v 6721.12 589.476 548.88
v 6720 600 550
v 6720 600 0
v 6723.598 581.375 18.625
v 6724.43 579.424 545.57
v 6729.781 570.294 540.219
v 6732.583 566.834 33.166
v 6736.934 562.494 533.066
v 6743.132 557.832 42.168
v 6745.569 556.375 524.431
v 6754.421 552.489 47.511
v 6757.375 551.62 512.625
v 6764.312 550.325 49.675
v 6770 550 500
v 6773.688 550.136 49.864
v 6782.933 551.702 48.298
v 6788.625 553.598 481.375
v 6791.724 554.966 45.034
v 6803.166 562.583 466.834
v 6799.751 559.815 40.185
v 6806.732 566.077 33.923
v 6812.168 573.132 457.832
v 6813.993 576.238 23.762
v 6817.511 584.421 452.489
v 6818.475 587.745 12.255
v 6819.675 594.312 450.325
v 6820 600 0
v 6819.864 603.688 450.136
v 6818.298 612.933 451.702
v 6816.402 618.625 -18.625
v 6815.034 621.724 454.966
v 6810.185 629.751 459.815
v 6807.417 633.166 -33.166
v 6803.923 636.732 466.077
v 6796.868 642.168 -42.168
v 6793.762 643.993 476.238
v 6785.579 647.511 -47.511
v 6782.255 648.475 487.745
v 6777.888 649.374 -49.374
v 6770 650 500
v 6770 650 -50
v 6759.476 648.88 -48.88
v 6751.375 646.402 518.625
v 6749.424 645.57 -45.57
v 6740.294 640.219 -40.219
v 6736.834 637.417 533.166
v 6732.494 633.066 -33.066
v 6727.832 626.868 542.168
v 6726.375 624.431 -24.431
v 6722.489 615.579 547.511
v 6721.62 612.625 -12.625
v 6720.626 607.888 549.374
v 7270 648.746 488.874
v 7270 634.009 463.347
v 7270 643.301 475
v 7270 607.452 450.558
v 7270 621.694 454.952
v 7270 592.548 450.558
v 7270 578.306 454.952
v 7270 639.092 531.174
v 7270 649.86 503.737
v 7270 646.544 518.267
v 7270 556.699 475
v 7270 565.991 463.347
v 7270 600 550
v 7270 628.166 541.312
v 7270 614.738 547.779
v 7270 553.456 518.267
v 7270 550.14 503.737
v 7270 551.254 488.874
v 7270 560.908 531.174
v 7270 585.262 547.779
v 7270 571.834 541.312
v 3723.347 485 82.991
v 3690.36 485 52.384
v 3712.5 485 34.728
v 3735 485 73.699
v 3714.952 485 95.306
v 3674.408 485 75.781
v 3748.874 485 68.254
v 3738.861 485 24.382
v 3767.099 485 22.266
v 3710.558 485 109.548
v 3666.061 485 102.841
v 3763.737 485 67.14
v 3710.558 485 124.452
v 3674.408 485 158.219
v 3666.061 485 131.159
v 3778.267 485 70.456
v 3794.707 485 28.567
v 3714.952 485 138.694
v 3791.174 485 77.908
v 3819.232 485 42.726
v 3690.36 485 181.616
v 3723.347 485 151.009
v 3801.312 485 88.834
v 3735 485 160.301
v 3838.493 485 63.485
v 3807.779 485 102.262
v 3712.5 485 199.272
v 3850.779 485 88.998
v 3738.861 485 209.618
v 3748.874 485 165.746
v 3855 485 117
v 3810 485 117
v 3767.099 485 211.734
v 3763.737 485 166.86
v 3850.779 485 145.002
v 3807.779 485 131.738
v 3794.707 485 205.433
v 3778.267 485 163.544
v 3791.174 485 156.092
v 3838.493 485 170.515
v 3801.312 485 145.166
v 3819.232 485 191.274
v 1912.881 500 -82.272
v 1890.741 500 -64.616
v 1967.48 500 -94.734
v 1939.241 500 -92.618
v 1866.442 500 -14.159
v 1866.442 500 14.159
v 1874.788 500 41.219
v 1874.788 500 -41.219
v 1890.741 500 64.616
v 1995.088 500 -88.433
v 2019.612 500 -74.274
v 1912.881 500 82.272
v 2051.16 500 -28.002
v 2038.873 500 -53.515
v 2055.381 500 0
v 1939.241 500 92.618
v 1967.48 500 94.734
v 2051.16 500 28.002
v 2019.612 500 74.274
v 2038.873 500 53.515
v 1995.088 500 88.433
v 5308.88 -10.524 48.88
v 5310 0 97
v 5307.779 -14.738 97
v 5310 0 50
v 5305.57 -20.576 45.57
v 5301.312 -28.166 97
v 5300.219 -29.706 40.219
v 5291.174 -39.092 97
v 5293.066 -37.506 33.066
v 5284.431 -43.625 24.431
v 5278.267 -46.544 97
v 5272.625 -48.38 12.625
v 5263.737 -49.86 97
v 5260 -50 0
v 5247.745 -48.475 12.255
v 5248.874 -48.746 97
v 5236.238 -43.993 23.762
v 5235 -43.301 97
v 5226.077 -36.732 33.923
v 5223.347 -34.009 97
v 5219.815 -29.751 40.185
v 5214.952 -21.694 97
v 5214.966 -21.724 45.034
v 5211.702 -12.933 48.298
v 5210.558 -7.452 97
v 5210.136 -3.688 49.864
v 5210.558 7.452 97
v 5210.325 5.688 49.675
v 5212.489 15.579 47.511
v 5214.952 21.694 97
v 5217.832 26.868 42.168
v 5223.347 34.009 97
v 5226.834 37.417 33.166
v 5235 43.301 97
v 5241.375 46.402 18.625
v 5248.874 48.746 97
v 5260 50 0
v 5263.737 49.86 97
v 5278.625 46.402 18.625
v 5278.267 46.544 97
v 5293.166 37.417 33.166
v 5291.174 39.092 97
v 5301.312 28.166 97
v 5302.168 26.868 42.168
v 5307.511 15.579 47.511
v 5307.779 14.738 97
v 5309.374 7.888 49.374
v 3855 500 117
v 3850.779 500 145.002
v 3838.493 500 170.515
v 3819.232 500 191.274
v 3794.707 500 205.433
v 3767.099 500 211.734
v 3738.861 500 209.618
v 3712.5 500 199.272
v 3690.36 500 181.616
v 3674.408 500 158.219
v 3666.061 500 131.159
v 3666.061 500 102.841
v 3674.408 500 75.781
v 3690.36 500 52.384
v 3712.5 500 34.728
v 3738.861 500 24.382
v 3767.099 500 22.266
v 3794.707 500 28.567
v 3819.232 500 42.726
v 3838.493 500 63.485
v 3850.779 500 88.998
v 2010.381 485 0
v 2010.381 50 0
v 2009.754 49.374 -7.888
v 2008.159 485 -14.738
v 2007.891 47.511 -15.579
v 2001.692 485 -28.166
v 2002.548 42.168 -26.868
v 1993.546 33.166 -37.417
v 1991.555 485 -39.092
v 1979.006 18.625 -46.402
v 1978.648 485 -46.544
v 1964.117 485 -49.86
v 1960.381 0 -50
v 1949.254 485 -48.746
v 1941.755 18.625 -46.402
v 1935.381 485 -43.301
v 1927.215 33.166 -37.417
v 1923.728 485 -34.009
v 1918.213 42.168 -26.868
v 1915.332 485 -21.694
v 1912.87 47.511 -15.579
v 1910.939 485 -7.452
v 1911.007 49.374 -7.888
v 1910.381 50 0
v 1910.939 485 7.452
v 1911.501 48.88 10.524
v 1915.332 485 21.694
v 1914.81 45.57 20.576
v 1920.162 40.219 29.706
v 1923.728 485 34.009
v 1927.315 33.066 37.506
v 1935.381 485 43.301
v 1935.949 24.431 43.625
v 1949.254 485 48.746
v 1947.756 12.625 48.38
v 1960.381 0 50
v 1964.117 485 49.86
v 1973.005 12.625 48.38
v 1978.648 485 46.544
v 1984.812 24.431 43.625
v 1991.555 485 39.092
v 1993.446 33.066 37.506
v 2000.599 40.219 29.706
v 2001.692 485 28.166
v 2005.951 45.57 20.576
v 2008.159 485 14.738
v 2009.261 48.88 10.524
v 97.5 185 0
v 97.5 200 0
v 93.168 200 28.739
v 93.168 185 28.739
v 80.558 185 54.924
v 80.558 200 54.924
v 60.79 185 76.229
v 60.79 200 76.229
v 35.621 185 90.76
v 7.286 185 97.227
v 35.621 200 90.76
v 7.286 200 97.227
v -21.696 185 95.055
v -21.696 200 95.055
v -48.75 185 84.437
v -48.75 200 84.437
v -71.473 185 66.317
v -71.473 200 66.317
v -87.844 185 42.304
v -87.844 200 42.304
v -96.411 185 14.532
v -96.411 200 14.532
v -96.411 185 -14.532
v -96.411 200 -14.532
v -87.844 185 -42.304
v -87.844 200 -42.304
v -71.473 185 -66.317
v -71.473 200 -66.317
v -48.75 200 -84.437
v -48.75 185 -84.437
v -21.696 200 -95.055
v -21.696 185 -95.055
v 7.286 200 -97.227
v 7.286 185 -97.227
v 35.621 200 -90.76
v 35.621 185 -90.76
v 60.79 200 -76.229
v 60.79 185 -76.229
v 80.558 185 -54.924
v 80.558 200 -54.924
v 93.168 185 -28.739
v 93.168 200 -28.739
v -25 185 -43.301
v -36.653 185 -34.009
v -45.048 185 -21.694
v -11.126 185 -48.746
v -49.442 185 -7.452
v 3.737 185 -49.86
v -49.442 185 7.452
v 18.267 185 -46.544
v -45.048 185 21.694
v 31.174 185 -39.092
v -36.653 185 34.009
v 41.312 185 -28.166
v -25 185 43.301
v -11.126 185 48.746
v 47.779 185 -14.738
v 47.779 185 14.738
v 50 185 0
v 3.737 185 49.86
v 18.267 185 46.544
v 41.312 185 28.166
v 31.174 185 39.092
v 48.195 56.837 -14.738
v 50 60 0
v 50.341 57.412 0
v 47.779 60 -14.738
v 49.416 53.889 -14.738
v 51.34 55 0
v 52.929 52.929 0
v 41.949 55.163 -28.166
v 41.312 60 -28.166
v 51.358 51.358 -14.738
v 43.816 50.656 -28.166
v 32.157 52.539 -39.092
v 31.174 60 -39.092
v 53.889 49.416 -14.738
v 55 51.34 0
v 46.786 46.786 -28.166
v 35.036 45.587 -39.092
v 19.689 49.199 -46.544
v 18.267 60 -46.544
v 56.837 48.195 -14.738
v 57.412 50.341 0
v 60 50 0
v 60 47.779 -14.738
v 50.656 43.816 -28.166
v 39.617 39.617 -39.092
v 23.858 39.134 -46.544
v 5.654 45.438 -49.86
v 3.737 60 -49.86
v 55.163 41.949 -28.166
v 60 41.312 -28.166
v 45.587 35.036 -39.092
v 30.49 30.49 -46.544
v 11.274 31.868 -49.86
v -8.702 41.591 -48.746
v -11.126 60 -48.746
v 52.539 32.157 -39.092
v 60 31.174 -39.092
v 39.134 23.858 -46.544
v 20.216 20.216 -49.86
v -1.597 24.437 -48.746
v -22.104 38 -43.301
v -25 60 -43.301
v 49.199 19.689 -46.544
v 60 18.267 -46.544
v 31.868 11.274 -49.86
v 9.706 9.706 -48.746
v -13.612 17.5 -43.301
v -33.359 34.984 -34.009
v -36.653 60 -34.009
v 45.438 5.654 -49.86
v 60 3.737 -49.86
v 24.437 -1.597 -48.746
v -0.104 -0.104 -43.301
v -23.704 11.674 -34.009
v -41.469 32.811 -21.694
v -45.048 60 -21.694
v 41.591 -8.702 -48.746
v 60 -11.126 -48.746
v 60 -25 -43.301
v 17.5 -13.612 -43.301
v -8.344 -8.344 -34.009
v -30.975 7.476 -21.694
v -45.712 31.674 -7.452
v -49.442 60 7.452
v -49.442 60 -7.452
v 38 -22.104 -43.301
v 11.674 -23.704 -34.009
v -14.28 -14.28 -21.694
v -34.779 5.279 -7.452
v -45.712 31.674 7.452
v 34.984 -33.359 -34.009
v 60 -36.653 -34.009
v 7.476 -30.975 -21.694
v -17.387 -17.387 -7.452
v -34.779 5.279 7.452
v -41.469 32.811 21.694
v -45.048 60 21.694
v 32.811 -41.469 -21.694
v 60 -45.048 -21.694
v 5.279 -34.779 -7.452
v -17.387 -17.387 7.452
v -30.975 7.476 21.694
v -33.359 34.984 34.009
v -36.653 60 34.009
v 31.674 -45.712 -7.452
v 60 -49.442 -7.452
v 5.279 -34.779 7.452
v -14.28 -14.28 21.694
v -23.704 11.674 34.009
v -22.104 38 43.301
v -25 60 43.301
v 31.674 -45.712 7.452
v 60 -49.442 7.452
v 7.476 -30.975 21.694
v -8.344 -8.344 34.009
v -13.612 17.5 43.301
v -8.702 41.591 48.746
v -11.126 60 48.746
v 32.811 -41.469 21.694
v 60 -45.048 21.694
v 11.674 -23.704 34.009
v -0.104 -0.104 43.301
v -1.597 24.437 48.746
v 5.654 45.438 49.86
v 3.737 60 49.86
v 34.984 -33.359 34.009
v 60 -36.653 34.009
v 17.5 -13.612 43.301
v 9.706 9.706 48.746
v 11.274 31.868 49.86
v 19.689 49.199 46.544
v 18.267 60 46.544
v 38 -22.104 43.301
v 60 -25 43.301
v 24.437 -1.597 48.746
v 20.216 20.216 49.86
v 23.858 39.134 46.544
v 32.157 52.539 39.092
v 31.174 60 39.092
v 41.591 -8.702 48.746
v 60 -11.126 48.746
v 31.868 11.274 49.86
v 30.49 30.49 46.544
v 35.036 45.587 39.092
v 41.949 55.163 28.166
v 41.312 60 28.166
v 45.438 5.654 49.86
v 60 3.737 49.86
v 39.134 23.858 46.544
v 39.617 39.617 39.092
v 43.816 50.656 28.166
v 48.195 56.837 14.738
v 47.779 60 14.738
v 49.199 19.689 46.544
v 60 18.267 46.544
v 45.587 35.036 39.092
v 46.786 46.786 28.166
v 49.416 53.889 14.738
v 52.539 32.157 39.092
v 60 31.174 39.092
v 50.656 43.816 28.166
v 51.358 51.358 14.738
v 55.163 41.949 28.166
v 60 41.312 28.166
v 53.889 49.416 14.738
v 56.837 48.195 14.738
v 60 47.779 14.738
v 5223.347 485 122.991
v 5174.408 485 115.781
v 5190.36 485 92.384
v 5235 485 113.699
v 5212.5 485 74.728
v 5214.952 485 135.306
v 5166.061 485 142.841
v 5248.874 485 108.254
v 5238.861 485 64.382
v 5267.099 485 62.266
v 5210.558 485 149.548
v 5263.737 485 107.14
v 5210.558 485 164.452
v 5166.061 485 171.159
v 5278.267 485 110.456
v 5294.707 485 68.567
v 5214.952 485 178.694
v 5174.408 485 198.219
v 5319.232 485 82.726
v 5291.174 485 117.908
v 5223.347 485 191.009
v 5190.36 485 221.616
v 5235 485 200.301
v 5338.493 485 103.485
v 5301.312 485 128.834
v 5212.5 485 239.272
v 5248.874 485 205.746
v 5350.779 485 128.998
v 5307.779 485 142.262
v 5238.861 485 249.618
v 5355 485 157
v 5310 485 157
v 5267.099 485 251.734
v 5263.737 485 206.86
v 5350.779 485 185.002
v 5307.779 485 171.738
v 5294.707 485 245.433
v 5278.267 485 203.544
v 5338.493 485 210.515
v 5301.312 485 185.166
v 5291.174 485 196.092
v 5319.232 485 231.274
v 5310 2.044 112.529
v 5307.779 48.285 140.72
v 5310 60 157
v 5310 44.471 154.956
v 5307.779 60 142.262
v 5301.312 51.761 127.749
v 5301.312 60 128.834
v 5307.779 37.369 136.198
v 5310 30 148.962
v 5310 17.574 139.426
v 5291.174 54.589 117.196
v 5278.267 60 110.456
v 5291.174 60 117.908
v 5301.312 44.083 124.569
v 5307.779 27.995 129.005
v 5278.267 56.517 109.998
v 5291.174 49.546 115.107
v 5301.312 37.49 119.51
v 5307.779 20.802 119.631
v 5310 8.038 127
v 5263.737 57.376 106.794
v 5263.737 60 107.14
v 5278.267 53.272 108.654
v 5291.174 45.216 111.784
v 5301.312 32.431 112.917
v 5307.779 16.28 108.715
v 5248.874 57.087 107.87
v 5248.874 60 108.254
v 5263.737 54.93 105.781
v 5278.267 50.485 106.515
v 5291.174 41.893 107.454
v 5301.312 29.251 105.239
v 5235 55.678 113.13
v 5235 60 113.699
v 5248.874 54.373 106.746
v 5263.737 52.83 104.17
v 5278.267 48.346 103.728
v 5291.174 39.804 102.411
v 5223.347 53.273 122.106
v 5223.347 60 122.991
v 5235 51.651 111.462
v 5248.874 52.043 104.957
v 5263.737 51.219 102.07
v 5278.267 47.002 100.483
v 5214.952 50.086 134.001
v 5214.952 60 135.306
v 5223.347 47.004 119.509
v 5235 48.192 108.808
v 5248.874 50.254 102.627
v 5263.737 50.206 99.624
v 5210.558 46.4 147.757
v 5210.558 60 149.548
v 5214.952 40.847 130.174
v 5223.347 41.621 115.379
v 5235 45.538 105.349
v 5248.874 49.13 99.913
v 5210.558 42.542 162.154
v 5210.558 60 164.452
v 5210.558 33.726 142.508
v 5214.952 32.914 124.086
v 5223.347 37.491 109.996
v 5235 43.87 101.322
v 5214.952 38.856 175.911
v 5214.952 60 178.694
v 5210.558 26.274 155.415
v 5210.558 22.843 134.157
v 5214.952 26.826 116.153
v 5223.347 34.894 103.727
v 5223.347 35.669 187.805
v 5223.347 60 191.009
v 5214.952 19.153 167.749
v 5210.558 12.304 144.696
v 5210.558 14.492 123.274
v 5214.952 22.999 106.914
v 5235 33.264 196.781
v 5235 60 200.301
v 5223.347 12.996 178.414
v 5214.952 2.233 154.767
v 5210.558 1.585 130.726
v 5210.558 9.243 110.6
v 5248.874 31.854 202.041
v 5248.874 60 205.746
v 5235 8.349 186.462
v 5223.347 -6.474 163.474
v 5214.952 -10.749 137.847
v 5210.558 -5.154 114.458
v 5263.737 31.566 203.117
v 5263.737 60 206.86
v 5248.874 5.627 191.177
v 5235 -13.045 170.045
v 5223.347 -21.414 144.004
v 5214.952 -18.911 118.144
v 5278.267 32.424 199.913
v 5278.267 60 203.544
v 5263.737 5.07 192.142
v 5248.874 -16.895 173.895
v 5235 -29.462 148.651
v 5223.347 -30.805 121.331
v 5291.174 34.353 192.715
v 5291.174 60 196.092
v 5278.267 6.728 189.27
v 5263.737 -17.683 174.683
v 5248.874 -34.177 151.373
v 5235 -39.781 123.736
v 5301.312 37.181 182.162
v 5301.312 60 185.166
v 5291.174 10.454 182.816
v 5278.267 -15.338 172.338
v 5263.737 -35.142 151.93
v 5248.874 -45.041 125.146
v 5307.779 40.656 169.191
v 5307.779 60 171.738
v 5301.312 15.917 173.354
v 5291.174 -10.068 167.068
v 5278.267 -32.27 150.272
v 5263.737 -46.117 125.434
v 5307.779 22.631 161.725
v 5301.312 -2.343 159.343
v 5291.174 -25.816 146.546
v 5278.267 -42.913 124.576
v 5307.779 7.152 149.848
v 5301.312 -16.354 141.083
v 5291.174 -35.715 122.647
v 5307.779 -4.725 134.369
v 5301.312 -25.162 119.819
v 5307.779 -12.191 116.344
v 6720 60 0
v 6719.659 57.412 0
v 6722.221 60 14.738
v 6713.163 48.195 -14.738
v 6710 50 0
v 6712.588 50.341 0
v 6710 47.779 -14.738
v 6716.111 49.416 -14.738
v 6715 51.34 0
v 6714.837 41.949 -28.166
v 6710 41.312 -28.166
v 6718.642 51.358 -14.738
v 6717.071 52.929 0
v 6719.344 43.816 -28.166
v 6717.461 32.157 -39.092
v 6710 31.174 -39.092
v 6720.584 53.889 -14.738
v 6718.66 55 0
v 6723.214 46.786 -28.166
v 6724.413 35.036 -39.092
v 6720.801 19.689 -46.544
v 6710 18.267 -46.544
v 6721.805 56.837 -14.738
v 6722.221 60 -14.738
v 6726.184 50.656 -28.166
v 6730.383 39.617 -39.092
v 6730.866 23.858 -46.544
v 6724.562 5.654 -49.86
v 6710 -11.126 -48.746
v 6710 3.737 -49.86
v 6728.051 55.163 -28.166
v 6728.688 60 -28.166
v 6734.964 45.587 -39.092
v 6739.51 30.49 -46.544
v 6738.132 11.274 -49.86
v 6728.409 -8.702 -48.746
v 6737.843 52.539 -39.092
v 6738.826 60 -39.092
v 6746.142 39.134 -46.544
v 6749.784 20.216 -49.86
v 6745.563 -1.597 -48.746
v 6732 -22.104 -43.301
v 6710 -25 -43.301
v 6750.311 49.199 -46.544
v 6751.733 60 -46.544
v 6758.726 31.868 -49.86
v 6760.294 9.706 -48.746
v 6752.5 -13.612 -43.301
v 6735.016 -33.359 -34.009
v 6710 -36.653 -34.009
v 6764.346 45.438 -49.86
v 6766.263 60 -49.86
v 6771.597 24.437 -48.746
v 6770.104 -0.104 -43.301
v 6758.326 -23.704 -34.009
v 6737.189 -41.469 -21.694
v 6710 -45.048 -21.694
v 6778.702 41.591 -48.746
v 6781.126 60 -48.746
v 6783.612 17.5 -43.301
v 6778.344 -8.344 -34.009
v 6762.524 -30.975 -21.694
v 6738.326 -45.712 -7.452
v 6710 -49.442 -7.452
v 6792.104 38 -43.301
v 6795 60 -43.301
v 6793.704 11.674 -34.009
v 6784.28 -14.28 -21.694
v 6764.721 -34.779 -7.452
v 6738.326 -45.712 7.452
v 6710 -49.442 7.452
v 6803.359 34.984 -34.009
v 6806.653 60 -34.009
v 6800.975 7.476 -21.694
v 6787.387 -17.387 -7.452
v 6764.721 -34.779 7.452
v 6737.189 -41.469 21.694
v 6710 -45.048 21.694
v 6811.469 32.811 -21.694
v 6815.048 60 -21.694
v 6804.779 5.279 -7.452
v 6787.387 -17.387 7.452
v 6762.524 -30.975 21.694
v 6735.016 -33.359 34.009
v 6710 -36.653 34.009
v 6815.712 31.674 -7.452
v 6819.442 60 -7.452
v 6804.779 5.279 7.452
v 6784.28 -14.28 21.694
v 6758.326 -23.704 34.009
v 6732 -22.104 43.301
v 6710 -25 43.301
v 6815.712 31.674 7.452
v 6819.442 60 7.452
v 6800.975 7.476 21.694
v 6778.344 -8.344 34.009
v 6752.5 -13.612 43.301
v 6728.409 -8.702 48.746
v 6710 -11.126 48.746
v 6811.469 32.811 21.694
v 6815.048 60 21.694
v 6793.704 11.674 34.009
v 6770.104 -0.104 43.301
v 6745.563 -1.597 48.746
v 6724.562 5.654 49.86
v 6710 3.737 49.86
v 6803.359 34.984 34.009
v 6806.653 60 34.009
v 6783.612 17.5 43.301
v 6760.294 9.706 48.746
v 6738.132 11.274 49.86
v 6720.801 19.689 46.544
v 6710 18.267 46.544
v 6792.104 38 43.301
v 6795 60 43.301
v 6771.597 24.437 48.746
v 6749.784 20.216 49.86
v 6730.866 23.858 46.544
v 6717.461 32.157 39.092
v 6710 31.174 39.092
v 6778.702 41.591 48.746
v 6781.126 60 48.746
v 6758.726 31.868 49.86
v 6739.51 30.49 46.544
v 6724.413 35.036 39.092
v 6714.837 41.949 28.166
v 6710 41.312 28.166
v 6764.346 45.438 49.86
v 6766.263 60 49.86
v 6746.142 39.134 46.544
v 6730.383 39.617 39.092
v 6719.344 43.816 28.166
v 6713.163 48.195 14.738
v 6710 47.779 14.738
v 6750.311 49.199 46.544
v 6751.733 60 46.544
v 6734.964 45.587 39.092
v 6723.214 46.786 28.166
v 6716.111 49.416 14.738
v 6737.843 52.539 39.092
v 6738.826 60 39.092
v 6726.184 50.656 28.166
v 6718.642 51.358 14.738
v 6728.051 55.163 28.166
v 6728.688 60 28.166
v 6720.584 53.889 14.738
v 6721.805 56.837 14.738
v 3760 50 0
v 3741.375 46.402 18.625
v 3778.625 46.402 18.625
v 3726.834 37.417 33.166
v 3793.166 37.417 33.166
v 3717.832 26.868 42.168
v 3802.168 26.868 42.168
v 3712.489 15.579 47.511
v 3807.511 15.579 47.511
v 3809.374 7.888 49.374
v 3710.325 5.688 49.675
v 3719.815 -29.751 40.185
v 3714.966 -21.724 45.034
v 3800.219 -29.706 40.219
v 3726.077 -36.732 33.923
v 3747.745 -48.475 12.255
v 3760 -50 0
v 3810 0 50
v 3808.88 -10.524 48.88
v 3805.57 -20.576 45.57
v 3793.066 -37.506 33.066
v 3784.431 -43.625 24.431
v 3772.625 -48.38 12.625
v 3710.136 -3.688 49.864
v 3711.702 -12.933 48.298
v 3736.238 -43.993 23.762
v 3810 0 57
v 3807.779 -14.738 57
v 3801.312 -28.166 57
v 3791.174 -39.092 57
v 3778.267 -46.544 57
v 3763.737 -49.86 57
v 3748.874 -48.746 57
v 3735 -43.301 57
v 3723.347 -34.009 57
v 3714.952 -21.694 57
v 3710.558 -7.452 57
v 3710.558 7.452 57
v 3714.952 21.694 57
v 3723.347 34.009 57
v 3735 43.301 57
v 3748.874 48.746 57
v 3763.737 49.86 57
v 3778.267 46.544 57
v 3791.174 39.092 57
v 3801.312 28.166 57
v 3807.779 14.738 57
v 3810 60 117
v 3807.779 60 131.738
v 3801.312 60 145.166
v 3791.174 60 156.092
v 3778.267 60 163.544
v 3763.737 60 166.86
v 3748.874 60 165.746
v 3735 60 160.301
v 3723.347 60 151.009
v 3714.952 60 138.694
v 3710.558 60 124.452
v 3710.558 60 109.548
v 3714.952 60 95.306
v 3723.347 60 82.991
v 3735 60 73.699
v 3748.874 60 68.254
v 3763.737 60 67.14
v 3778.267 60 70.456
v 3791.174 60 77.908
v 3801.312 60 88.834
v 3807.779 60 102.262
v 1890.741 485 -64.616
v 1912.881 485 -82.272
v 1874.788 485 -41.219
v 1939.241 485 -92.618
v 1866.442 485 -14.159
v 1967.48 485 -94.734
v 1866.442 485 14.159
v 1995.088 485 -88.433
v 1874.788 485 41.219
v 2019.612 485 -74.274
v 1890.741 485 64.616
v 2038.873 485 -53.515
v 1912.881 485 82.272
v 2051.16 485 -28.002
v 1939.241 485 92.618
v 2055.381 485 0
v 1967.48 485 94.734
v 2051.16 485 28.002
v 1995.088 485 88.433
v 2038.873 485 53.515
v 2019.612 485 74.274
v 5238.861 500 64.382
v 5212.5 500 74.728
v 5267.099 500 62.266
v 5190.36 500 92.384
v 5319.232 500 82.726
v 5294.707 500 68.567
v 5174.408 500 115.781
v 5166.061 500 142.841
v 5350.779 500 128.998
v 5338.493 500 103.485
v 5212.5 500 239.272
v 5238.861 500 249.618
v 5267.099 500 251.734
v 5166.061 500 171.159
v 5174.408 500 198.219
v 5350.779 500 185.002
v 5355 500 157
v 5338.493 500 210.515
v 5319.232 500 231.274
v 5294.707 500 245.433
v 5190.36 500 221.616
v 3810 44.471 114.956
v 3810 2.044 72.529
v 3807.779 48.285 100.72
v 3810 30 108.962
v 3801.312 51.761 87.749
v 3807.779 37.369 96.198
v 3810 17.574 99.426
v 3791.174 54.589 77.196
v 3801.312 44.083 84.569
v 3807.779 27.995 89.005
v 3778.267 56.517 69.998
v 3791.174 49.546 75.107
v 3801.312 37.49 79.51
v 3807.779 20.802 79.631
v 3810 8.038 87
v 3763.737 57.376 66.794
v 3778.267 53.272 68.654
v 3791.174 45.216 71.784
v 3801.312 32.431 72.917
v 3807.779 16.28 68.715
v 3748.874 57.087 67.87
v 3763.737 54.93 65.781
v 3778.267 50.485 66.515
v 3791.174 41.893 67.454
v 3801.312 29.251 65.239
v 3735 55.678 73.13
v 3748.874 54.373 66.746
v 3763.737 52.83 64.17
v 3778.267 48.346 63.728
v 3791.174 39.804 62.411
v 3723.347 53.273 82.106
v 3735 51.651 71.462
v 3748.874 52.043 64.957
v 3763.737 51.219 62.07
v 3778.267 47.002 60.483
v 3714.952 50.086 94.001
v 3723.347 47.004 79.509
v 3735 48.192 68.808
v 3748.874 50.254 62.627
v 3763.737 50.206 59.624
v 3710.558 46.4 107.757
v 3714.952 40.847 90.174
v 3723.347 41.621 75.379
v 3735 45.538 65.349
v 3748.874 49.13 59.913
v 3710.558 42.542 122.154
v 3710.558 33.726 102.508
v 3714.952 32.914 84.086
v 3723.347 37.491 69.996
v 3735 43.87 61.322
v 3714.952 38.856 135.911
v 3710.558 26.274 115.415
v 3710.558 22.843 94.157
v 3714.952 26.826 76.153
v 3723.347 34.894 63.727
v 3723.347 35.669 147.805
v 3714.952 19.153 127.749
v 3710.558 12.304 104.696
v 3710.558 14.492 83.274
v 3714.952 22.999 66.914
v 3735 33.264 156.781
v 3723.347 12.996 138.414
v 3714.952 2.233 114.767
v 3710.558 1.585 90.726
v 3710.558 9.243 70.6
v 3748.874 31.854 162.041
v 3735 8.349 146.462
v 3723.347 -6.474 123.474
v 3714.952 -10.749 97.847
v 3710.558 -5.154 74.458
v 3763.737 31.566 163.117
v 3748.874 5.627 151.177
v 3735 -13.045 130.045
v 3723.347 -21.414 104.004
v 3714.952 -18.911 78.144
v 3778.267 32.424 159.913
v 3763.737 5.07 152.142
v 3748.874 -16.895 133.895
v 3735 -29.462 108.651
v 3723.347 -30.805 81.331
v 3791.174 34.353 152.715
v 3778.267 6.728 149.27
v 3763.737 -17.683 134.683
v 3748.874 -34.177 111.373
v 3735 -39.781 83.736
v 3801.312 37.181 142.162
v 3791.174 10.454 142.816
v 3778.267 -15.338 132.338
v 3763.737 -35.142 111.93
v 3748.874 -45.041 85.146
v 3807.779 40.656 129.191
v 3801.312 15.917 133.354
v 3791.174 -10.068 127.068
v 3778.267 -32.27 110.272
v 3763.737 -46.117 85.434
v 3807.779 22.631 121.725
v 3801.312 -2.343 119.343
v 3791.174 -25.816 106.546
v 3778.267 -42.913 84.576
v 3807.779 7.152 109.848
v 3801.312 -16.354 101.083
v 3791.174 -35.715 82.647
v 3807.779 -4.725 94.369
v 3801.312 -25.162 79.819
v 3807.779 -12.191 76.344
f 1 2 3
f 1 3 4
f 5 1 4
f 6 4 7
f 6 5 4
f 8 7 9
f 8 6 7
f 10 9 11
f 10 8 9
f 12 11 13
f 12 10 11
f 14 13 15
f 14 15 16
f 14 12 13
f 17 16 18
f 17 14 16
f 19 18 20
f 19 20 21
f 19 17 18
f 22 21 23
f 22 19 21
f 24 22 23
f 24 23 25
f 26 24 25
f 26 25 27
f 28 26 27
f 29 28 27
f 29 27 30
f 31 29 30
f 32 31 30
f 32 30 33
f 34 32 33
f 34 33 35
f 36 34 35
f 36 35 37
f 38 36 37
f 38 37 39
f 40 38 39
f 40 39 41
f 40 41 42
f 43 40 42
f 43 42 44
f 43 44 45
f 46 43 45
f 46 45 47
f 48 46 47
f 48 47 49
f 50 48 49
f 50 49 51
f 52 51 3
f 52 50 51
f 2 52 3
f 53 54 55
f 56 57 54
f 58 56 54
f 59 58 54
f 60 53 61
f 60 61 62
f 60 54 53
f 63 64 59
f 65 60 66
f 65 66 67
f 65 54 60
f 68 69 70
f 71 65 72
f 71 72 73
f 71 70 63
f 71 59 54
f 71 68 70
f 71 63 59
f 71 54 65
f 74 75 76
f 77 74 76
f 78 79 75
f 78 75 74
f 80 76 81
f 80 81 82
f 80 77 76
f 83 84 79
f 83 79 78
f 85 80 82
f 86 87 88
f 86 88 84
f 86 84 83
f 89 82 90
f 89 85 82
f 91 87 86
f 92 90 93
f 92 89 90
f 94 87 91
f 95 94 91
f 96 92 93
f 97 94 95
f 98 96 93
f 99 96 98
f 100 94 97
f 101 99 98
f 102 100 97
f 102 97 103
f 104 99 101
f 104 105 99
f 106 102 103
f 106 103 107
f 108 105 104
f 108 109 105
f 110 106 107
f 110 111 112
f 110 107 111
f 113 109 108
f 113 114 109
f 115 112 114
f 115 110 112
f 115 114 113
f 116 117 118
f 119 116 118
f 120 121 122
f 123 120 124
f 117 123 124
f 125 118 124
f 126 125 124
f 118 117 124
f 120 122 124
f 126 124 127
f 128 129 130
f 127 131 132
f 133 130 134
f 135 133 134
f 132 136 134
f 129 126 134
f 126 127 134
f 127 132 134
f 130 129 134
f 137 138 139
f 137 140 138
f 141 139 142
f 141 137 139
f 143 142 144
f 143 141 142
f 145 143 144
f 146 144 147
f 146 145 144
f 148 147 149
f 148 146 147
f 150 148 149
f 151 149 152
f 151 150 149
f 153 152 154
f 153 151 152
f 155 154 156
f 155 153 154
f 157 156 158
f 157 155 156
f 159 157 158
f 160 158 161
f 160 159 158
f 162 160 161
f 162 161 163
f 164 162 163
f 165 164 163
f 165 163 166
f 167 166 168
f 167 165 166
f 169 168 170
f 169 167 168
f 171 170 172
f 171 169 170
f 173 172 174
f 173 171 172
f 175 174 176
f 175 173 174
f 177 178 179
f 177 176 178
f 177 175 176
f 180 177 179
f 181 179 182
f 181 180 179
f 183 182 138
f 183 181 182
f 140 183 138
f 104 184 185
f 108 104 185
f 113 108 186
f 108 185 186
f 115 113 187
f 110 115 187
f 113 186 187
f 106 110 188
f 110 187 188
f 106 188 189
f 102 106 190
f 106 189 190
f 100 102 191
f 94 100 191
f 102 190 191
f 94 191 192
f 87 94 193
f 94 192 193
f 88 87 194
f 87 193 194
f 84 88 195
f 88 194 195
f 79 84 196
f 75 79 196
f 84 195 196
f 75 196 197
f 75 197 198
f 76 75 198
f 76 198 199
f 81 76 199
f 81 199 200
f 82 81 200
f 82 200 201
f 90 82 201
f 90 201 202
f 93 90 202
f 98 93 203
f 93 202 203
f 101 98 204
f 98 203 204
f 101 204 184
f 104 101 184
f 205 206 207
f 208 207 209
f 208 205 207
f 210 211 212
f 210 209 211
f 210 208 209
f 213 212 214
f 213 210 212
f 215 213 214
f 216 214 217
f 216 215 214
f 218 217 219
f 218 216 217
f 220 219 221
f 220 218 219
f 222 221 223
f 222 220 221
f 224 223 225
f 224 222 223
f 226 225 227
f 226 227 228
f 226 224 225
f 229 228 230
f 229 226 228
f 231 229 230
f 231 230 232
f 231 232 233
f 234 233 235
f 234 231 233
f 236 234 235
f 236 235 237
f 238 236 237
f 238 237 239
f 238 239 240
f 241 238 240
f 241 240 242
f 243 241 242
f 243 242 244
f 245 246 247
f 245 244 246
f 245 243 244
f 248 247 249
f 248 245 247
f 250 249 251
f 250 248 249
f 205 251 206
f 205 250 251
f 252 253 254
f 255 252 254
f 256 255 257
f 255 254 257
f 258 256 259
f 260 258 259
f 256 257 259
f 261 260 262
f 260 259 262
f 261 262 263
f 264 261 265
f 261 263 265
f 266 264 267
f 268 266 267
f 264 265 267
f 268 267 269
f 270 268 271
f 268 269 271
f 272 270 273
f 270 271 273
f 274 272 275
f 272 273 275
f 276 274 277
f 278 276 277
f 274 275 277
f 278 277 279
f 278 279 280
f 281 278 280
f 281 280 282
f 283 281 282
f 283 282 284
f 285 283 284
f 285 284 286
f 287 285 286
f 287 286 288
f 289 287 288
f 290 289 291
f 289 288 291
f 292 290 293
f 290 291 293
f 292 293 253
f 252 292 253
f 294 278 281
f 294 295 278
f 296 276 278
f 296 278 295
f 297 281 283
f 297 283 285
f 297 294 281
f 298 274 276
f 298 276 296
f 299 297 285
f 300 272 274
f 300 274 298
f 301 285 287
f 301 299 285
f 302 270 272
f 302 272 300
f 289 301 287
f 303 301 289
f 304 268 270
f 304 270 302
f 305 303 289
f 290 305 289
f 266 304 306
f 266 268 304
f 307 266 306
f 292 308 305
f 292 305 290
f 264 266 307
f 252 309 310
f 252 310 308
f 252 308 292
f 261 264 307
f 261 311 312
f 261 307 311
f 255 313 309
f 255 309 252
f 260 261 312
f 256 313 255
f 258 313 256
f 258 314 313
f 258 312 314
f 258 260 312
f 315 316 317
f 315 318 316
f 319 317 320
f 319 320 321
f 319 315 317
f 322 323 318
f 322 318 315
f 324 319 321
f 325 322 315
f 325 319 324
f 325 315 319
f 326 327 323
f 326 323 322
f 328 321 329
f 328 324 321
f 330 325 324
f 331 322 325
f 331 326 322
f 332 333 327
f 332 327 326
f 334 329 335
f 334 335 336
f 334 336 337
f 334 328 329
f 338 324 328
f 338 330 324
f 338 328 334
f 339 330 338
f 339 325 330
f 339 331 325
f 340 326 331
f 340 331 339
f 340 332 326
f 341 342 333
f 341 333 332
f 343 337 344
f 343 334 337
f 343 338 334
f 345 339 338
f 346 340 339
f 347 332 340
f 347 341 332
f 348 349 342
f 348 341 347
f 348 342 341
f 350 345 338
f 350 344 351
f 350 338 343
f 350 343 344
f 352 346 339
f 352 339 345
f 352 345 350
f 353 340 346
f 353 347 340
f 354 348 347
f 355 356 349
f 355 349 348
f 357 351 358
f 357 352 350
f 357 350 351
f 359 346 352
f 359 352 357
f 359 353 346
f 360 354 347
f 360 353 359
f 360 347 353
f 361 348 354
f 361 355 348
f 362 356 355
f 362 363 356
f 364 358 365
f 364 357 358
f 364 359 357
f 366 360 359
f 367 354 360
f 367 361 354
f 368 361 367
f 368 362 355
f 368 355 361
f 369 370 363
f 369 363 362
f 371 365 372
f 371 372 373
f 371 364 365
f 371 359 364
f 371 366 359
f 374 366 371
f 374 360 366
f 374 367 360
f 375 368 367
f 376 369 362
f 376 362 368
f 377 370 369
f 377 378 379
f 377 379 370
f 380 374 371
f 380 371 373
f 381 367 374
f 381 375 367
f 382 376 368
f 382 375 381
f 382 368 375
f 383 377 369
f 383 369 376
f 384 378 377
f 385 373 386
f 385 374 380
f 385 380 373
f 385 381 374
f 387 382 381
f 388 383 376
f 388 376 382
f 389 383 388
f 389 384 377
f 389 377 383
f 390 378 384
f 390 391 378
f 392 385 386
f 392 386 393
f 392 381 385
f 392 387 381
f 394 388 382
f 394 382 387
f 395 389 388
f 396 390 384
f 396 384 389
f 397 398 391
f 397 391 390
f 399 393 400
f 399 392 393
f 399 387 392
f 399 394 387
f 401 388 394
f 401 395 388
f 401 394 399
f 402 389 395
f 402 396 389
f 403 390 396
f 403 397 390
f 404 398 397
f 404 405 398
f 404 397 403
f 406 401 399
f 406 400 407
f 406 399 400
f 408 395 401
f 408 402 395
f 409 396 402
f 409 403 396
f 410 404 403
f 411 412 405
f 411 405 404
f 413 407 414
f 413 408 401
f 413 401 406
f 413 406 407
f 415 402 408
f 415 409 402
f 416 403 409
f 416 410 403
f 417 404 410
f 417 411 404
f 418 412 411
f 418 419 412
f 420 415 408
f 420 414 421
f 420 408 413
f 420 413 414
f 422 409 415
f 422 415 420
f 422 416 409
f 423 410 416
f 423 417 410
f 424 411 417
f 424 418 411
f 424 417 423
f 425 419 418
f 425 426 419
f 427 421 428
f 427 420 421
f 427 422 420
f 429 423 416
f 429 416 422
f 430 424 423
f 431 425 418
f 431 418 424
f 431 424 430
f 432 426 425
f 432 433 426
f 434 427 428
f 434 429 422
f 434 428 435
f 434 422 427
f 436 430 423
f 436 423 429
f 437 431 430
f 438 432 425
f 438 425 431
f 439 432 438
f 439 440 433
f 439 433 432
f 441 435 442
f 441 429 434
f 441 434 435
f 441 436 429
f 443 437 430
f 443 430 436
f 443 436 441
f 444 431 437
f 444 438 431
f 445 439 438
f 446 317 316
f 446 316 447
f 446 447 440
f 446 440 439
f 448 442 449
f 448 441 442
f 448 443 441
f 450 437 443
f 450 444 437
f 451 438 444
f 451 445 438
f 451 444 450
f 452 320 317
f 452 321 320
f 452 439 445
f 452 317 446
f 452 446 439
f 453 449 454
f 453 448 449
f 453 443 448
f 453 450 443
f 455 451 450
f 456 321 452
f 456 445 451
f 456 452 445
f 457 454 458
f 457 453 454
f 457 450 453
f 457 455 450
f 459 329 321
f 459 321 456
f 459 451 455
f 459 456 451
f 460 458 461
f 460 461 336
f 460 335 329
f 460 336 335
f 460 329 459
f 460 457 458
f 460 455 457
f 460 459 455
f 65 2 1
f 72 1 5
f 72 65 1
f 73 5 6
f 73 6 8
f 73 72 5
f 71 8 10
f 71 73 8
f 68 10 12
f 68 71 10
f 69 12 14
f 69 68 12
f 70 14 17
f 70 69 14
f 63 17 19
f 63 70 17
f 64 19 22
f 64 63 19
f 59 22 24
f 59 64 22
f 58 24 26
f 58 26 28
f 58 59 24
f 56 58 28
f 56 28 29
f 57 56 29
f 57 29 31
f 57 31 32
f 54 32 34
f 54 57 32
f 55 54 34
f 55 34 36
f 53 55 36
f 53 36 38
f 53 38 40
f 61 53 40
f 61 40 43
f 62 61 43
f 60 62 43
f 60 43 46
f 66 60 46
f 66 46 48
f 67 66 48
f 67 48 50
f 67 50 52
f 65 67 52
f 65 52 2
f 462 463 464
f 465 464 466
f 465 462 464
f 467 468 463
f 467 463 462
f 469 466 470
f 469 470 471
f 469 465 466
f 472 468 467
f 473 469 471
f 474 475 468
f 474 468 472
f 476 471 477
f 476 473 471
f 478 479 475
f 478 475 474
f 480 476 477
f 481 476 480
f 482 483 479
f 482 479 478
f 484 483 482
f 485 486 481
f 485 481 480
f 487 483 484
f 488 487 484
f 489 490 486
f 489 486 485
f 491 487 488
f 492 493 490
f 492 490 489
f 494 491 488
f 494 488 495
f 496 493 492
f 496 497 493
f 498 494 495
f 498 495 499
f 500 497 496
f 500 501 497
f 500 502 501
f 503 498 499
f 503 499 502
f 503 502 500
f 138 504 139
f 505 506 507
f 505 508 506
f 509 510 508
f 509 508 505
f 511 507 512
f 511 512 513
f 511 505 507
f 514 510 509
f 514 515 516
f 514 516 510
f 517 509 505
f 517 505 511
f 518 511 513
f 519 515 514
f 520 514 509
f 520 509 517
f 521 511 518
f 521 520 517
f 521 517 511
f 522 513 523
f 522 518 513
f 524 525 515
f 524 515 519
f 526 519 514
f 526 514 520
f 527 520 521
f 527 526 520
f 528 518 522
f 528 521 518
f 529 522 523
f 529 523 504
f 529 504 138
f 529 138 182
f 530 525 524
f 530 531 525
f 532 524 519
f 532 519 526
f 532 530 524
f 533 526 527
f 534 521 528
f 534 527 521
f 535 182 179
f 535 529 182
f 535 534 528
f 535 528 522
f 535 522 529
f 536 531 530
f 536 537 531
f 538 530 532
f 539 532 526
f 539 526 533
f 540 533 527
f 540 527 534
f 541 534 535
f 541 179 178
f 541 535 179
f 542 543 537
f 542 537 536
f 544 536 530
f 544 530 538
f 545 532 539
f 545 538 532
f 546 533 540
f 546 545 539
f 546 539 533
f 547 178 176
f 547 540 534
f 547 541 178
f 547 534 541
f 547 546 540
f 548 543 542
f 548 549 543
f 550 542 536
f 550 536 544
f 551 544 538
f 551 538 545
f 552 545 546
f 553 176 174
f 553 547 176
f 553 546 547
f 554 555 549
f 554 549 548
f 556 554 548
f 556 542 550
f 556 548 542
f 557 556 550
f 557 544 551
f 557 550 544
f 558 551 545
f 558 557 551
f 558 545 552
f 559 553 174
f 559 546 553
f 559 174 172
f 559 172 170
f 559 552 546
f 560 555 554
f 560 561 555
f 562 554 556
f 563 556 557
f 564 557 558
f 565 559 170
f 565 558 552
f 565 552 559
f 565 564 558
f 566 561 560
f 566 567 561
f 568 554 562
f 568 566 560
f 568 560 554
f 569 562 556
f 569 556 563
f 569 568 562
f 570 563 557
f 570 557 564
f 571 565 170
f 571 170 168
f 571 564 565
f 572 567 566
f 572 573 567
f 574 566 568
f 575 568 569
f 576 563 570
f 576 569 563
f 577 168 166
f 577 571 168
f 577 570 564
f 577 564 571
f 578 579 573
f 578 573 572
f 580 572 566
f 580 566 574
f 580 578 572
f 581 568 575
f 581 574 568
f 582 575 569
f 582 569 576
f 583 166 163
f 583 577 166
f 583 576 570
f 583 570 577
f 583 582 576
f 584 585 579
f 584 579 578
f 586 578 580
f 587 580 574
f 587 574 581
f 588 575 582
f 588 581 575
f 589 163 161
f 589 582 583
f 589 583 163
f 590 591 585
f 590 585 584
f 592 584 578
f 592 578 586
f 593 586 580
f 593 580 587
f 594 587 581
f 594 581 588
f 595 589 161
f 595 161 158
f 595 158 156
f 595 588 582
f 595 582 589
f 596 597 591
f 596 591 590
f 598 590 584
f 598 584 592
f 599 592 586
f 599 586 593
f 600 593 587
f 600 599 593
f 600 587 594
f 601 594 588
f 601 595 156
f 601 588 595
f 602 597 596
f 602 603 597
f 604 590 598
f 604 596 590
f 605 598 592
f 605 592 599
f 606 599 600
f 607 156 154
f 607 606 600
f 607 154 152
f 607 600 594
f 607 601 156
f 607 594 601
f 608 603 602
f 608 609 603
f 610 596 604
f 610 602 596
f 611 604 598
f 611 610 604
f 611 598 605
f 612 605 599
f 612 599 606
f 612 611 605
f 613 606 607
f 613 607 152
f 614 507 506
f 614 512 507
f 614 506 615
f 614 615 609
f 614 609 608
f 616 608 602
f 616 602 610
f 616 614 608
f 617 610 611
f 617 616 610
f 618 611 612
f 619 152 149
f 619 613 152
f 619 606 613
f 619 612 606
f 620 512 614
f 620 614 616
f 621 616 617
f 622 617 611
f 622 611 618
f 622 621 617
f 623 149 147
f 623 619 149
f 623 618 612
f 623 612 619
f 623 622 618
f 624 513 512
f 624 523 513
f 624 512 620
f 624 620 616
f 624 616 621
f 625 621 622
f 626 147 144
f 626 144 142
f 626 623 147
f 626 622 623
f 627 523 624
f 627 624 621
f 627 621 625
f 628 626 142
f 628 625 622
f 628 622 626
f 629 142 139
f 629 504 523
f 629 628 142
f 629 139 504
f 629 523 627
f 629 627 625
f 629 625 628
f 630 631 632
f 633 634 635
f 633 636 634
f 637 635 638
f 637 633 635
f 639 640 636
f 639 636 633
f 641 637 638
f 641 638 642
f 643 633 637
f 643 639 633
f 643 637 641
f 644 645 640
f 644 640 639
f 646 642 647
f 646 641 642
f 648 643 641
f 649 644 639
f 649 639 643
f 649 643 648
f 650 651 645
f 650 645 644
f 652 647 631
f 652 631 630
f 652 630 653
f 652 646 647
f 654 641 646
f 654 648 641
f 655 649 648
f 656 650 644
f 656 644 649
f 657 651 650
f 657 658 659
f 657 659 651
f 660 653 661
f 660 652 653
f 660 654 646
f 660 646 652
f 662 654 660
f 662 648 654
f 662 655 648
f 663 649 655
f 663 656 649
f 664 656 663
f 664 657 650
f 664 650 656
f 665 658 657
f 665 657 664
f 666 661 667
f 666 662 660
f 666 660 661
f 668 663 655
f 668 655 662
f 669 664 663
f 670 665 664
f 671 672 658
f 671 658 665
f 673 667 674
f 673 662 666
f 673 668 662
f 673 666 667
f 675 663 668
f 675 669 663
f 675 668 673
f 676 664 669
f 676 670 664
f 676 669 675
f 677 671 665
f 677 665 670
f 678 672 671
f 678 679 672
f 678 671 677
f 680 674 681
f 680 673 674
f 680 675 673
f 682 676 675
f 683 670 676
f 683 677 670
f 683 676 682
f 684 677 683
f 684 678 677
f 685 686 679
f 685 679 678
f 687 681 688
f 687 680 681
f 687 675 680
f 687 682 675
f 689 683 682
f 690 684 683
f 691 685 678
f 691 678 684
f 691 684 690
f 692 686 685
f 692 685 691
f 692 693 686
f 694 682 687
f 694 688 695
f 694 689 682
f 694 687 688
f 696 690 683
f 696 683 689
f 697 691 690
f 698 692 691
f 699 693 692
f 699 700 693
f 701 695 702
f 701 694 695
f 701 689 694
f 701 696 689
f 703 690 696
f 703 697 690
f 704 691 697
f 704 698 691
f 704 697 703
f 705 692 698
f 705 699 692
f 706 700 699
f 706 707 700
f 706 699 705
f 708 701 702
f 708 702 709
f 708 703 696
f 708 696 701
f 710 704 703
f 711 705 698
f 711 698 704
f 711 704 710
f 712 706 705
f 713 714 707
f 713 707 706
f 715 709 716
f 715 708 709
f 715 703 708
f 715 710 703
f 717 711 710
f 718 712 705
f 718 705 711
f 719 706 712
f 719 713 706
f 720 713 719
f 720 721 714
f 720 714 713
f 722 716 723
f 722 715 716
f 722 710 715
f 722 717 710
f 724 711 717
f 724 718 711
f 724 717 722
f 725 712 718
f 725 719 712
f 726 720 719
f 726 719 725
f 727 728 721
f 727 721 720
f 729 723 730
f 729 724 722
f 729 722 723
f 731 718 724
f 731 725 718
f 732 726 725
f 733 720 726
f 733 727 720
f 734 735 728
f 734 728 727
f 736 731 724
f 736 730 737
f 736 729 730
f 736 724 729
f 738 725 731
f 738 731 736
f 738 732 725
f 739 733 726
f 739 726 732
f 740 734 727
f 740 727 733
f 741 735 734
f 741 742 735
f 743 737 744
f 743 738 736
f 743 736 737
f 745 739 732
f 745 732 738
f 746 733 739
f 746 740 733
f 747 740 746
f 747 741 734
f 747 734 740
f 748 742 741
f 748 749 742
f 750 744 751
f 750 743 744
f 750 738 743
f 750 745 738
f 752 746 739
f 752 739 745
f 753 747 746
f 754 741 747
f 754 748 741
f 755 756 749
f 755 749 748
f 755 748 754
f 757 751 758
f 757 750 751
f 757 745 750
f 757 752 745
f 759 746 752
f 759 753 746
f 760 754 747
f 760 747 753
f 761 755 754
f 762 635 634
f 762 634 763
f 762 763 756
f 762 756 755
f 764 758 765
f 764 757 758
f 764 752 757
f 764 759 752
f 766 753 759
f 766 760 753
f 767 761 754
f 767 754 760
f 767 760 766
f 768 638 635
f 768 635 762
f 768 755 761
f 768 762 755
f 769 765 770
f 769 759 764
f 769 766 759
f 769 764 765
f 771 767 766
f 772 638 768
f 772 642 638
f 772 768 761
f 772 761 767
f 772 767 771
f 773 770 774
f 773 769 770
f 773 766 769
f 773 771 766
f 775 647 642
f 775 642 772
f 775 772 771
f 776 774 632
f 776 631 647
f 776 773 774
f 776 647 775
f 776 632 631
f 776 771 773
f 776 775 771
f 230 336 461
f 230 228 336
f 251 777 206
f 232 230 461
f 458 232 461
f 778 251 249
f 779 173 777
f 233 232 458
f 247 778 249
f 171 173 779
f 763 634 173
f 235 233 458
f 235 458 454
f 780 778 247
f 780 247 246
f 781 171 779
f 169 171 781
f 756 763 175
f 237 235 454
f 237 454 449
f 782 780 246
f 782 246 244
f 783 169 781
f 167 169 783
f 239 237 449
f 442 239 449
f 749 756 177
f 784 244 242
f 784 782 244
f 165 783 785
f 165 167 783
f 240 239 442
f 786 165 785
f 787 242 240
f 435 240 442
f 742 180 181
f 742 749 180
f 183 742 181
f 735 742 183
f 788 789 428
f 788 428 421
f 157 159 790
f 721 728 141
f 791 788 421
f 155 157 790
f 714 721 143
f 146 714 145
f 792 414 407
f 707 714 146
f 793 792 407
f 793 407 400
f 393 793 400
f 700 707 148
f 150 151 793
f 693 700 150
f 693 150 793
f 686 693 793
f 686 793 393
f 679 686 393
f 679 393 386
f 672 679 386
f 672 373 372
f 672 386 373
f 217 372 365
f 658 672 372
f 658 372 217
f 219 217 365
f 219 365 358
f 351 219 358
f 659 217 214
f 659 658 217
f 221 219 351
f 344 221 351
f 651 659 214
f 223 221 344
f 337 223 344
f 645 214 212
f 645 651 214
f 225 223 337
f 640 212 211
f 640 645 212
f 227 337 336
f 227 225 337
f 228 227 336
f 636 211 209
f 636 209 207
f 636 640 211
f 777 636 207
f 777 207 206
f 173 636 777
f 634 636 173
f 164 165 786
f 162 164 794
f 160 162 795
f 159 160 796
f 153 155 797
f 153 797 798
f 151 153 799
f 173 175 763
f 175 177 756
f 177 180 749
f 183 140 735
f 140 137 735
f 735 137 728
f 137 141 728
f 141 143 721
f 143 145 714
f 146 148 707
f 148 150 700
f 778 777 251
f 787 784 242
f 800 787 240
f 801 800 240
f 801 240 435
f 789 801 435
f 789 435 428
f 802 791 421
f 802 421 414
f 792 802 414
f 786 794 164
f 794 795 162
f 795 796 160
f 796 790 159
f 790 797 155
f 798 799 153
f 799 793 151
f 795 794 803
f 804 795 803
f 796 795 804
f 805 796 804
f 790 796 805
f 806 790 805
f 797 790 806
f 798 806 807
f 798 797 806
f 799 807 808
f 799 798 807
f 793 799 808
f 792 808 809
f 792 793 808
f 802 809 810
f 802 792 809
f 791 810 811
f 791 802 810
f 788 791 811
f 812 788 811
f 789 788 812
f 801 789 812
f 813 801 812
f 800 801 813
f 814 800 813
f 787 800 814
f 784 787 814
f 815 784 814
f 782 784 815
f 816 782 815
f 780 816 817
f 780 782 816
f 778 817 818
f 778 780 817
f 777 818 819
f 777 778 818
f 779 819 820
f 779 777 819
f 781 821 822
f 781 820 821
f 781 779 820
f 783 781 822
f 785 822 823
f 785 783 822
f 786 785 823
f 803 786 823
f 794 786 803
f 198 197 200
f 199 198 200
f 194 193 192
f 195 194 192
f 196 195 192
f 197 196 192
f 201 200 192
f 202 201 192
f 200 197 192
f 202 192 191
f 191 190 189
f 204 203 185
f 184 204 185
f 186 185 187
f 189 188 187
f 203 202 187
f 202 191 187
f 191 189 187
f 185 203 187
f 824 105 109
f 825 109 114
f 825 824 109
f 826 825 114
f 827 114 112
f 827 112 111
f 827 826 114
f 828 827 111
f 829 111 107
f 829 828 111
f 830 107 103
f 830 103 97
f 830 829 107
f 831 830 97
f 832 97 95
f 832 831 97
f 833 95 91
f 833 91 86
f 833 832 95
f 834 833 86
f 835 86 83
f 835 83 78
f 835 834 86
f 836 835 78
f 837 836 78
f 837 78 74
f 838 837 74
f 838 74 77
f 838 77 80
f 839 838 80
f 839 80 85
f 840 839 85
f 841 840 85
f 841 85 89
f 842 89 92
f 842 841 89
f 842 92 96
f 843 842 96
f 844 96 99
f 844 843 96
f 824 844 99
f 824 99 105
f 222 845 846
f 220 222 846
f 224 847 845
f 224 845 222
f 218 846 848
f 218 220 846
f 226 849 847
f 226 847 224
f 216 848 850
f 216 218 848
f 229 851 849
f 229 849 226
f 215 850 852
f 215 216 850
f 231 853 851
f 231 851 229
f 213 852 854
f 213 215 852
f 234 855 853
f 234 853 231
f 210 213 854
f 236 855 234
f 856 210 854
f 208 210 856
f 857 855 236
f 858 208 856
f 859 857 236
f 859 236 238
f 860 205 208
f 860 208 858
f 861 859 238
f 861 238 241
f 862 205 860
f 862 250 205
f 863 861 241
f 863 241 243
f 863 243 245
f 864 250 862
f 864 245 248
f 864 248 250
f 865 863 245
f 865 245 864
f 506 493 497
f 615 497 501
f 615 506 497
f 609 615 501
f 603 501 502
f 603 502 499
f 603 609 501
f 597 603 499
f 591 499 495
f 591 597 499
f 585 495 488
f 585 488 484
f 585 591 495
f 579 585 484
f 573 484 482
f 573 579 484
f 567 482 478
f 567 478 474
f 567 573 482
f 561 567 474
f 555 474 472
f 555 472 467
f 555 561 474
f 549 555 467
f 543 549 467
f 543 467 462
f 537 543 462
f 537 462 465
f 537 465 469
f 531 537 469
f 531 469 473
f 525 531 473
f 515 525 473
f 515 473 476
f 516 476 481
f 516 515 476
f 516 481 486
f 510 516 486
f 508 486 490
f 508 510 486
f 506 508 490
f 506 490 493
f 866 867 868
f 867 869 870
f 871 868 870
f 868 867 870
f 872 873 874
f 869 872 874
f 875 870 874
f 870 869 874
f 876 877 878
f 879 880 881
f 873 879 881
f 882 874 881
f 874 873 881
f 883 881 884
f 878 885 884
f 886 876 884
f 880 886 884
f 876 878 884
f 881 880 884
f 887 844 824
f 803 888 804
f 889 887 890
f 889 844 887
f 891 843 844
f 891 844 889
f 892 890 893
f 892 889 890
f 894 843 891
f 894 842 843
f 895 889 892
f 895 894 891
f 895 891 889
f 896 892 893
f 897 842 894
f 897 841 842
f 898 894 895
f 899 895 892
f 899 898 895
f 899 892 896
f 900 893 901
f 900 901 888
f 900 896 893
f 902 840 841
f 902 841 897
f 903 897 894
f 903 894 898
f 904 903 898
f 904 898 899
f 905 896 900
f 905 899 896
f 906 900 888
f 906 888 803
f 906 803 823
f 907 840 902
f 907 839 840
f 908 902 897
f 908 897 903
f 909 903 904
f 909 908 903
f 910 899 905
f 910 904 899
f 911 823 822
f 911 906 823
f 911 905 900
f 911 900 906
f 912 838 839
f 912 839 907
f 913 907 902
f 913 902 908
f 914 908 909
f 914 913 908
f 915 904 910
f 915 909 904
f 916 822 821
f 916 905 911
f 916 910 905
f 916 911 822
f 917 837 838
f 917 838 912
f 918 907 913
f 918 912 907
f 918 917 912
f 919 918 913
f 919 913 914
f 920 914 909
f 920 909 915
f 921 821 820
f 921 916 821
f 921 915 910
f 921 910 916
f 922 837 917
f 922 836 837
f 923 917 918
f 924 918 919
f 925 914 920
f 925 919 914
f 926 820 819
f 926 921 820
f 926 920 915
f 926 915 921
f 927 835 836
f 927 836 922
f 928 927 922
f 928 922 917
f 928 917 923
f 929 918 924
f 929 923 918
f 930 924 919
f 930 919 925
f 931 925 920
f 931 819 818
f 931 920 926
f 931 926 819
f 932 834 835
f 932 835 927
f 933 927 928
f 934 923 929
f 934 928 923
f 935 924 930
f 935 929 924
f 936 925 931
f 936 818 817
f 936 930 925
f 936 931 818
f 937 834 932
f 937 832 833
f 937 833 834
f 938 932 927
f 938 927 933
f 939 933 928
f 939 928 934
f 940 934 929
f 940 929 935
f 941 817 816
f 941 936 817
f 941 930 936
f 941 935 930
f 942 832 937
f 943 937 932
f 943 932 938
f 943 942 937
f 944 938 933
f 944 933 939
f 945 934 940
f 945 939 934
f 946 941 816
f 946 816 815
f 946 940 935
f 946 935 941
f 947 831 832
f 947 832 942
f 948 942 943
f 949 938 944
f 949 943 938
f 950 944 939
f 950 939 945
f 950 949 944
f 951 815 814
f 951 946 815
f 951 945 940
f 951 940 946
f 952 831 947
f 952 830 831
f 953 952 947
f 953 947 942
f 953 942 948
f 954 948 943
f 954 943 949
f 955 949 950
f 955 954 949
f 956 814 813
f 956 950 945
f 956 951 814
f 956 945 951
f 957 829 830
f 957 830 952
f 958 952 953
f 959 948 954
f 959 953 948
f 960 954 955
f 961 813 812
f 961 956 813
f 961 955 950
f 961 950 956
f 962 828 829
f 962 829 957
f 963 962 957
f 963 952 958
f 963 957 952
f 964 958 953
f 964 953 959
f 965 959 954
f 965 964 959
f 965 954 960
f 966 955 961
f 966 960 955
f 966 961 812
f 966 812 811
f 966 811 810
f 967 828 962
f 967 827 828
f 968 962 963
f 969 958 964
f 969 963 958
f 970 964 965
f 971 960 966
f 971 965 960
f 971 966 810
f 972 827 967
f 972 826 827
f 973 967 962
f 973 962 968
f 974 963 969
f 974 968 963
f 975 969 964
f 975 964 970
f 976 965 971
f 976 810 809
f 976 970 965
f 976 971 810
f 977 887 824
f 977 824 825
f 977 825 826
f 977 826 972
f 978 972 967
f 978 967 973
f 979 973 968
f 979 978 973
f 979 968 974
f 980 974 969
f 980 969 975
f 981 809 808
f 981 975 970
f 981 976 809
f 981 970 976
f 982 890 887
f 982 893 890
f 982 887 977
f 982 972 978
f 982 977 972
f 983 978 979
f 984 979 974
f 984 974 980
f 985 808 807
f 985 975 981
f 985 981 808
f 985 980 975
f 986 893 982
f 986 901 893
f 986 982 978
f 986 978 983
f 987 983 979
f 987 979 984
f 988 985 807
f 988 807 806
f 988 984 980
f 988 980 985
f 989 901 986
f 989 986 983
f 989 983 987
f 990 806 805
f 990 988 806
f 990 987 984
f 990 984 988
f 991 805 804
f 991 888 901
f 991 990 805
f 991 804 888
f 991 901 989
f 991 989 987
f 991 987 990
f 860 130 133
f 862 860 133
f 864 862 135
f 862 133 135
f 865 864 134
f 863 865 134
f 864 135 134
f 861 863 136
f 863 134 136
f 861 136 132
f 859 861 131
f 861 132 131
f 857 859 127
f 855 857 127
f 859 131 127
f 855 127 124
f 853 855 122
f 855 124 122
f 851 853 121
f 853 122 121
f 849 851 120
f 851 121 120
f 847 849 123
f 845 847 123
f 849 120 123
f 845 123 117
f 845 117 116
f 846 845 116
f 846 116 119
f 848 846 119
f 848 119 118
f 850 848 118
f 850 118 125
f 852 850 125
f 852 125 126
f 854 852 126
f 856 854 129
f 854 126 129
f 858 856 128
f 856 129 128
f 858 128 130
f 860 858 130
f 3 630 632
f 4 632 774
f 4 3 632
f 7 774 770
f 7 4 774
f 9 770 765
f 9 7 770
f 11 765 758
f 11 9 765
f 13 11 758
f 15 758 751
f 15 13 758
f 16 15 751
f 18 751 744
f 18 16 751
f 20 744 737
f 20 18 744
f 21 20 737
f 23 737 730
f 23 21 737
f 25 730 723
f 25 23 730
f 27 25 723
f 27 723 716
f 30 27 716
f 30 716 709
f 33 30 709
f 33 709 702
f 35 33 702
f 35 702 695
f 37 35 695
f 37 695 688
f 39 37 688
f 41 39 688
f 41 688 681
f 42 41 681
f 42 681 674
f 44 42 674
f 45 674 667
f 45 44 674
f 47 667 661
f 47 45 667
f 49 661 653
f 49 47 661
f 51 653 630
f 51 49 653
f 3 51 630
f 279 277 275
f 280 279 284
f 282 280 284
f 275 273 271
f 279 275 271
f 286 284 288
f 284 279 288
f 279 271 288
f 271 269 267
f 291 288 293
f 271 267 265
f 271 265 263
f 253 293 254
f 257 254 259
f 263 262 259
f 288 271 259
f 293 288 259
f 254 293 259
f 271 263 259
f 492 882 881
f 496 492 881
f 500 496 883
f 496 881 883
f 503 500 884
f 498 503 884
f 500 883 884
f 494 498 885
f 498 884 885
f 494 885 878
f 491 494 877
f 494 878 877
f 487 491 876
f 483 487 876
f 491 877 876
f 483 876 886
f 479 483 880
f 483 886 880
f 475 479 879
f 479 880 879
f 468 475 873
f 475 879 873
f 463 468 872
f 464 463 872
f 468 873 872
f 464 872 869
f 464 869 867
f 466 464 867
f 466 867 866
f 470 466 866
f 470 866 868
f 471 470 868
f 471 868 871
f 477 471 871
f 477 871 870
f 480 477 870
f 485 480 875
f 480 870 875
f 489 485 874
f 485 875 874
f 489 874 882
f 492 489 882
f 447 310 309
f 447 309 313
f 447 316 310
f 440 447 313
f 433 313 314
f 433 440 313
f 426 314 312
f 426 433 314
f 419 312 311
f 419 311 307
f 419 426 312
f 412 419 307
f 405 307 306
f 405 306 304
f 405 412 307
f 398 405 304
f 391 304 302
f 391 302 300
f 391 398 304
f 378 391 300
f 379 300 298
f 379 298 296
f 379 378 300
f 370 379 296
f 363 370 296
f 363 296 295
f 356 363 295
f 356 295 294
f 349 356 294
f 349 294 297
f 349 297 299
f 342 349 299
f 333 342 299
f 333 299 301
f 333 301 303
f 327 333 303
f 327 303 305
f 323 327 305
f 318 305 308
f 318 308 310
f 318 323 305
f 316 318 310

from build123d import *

# Parameters (mm, degrees)
F2_R      = 50
F2_R_2    = 97.5
F9_DEPTH  = 15
F14_R     = 50
F14_R_2   = 95
F18_DEPTH = 15


# Not quite as in the source:
# - a feature names something its author has since deleted; it is built from what else it names


with BuildPart() as f8:
    # F8: sweep along a path in F0, F5, F7
    with BuildLine(Plane.XY) as f8_path:
        Line((0, 200), (0, 60))
        ThreePointArc((0, 60), (17.5735931288, 17.5735931288), (60, 0))
        Line((60, 0), (6710, 0))
        ThreePointArc((6710, 0), (6752.4264068712, 17.5735931288), (6770, 60))
        Line((6770, 60), (6770, 540))
        Line((6770, 540), (6770, 600))
    with BuildLine(Plane.YZ.offset(6770)) as f8_path_2:
        Line((600, 0), (600, 500))
    with BuildLine(Plane.XZ.offset(-600)) as f8_path_3:
        Line((6770, 500), (7270, 500))
    # F2 (on offset) → F8 (sweep)
    with BuildSketch(Plane.XZ.offset(-200)):
        Circle(F2_R)
    sweep(path=f8_path.line + f8_path_2.line + f8_path_3.line, transition=Transition.RIGHT)

    # F2 (on offset) → F9 (join)
    with BuildSketch(Plane.XZ.offset(-200)):
        Circle(F2_R_2)
        Circle(F2_R, mode=Mode.SUBTRACT)
        Circle(F2_R)
    extrude(amount=F9_DEPTH)

    # F15: sweep along a path in F0
    with BuildLine(Plane.XY) as f15_path:
        Line((1960.38051, 0), (1960.38051, 500))
    # F14 (on offset) → F15 (sweep)
    with BuildSketch(Plane.XZ.offset(-500)):
        with Locations((1960.38051, 0)):
            Circle(F14_R)
    sweep(path=f15_path.line)

    # F16: sweep along a path in F11
    with BuildLine(Plane.YZ.offset(3760)) as f16_path:
        Line((500, 117), (60, 117))
        ThreePointArc((60, 117), (17.5735931288, 99.4264068712), (0, 57))
        Line((0, 57), (0, 0))
    # F14 (on offset) → F16 (sweep)
    with BuildSketch(Plane.XZ.offset(-500)):
        with Locations((3760, 117)):
            Circle(F14_R)
    sweep(path=f16_path.line)

    # F17: sweep along a path in F13
    with BuildLine(Plane.YZ.offset(5260)) as f17_path:
        Line((500, 157), (60, 157))
        ThreePointArc((60, 157), (17.5735931288, 139.4264068712), (0, 97))
        Line((0, 97), (0, 0))
    # F14 (on offset) → F17 (sweep)
    with BuildSketch(Plane.XZ.offset(-500)):
        with Locations((5260, 157)):
            Circle(F14_R)
    sweep(path=f17_path.line)

    # F14 (on offset) → F18 (join)
    with BuildSketch(Plane.XZ.offset(-500)):
        with Locations((1960.38051, 0)):
            Circle(F14_R_2)
        with Locations((1960.38051, 0)):
            Circle(F14_R, mode=Mode.SUBTRACT)
        with Locations((3760, 117)):
            Circle(F14_R_2)
        with Locations((3760, 117)):
            Circle(F14_R, mode=Mode.SUBTRACT)
        with Locations((5260, 157)):
            Circle(F14_R_2)
        with Locations((5260, 157)):
            Circle(F14_R, mode=Mode.SUBTRACT)
        with Locations((1960.38051, 0)):
            Circle(F14_R)
        with Locations((3760, 117)):
            Circle(F14_R)
        with Locations((5260, 157)):
            Circle(F14_R)
    extrude(amount=F18_DEPTH)


solid = f8.part
